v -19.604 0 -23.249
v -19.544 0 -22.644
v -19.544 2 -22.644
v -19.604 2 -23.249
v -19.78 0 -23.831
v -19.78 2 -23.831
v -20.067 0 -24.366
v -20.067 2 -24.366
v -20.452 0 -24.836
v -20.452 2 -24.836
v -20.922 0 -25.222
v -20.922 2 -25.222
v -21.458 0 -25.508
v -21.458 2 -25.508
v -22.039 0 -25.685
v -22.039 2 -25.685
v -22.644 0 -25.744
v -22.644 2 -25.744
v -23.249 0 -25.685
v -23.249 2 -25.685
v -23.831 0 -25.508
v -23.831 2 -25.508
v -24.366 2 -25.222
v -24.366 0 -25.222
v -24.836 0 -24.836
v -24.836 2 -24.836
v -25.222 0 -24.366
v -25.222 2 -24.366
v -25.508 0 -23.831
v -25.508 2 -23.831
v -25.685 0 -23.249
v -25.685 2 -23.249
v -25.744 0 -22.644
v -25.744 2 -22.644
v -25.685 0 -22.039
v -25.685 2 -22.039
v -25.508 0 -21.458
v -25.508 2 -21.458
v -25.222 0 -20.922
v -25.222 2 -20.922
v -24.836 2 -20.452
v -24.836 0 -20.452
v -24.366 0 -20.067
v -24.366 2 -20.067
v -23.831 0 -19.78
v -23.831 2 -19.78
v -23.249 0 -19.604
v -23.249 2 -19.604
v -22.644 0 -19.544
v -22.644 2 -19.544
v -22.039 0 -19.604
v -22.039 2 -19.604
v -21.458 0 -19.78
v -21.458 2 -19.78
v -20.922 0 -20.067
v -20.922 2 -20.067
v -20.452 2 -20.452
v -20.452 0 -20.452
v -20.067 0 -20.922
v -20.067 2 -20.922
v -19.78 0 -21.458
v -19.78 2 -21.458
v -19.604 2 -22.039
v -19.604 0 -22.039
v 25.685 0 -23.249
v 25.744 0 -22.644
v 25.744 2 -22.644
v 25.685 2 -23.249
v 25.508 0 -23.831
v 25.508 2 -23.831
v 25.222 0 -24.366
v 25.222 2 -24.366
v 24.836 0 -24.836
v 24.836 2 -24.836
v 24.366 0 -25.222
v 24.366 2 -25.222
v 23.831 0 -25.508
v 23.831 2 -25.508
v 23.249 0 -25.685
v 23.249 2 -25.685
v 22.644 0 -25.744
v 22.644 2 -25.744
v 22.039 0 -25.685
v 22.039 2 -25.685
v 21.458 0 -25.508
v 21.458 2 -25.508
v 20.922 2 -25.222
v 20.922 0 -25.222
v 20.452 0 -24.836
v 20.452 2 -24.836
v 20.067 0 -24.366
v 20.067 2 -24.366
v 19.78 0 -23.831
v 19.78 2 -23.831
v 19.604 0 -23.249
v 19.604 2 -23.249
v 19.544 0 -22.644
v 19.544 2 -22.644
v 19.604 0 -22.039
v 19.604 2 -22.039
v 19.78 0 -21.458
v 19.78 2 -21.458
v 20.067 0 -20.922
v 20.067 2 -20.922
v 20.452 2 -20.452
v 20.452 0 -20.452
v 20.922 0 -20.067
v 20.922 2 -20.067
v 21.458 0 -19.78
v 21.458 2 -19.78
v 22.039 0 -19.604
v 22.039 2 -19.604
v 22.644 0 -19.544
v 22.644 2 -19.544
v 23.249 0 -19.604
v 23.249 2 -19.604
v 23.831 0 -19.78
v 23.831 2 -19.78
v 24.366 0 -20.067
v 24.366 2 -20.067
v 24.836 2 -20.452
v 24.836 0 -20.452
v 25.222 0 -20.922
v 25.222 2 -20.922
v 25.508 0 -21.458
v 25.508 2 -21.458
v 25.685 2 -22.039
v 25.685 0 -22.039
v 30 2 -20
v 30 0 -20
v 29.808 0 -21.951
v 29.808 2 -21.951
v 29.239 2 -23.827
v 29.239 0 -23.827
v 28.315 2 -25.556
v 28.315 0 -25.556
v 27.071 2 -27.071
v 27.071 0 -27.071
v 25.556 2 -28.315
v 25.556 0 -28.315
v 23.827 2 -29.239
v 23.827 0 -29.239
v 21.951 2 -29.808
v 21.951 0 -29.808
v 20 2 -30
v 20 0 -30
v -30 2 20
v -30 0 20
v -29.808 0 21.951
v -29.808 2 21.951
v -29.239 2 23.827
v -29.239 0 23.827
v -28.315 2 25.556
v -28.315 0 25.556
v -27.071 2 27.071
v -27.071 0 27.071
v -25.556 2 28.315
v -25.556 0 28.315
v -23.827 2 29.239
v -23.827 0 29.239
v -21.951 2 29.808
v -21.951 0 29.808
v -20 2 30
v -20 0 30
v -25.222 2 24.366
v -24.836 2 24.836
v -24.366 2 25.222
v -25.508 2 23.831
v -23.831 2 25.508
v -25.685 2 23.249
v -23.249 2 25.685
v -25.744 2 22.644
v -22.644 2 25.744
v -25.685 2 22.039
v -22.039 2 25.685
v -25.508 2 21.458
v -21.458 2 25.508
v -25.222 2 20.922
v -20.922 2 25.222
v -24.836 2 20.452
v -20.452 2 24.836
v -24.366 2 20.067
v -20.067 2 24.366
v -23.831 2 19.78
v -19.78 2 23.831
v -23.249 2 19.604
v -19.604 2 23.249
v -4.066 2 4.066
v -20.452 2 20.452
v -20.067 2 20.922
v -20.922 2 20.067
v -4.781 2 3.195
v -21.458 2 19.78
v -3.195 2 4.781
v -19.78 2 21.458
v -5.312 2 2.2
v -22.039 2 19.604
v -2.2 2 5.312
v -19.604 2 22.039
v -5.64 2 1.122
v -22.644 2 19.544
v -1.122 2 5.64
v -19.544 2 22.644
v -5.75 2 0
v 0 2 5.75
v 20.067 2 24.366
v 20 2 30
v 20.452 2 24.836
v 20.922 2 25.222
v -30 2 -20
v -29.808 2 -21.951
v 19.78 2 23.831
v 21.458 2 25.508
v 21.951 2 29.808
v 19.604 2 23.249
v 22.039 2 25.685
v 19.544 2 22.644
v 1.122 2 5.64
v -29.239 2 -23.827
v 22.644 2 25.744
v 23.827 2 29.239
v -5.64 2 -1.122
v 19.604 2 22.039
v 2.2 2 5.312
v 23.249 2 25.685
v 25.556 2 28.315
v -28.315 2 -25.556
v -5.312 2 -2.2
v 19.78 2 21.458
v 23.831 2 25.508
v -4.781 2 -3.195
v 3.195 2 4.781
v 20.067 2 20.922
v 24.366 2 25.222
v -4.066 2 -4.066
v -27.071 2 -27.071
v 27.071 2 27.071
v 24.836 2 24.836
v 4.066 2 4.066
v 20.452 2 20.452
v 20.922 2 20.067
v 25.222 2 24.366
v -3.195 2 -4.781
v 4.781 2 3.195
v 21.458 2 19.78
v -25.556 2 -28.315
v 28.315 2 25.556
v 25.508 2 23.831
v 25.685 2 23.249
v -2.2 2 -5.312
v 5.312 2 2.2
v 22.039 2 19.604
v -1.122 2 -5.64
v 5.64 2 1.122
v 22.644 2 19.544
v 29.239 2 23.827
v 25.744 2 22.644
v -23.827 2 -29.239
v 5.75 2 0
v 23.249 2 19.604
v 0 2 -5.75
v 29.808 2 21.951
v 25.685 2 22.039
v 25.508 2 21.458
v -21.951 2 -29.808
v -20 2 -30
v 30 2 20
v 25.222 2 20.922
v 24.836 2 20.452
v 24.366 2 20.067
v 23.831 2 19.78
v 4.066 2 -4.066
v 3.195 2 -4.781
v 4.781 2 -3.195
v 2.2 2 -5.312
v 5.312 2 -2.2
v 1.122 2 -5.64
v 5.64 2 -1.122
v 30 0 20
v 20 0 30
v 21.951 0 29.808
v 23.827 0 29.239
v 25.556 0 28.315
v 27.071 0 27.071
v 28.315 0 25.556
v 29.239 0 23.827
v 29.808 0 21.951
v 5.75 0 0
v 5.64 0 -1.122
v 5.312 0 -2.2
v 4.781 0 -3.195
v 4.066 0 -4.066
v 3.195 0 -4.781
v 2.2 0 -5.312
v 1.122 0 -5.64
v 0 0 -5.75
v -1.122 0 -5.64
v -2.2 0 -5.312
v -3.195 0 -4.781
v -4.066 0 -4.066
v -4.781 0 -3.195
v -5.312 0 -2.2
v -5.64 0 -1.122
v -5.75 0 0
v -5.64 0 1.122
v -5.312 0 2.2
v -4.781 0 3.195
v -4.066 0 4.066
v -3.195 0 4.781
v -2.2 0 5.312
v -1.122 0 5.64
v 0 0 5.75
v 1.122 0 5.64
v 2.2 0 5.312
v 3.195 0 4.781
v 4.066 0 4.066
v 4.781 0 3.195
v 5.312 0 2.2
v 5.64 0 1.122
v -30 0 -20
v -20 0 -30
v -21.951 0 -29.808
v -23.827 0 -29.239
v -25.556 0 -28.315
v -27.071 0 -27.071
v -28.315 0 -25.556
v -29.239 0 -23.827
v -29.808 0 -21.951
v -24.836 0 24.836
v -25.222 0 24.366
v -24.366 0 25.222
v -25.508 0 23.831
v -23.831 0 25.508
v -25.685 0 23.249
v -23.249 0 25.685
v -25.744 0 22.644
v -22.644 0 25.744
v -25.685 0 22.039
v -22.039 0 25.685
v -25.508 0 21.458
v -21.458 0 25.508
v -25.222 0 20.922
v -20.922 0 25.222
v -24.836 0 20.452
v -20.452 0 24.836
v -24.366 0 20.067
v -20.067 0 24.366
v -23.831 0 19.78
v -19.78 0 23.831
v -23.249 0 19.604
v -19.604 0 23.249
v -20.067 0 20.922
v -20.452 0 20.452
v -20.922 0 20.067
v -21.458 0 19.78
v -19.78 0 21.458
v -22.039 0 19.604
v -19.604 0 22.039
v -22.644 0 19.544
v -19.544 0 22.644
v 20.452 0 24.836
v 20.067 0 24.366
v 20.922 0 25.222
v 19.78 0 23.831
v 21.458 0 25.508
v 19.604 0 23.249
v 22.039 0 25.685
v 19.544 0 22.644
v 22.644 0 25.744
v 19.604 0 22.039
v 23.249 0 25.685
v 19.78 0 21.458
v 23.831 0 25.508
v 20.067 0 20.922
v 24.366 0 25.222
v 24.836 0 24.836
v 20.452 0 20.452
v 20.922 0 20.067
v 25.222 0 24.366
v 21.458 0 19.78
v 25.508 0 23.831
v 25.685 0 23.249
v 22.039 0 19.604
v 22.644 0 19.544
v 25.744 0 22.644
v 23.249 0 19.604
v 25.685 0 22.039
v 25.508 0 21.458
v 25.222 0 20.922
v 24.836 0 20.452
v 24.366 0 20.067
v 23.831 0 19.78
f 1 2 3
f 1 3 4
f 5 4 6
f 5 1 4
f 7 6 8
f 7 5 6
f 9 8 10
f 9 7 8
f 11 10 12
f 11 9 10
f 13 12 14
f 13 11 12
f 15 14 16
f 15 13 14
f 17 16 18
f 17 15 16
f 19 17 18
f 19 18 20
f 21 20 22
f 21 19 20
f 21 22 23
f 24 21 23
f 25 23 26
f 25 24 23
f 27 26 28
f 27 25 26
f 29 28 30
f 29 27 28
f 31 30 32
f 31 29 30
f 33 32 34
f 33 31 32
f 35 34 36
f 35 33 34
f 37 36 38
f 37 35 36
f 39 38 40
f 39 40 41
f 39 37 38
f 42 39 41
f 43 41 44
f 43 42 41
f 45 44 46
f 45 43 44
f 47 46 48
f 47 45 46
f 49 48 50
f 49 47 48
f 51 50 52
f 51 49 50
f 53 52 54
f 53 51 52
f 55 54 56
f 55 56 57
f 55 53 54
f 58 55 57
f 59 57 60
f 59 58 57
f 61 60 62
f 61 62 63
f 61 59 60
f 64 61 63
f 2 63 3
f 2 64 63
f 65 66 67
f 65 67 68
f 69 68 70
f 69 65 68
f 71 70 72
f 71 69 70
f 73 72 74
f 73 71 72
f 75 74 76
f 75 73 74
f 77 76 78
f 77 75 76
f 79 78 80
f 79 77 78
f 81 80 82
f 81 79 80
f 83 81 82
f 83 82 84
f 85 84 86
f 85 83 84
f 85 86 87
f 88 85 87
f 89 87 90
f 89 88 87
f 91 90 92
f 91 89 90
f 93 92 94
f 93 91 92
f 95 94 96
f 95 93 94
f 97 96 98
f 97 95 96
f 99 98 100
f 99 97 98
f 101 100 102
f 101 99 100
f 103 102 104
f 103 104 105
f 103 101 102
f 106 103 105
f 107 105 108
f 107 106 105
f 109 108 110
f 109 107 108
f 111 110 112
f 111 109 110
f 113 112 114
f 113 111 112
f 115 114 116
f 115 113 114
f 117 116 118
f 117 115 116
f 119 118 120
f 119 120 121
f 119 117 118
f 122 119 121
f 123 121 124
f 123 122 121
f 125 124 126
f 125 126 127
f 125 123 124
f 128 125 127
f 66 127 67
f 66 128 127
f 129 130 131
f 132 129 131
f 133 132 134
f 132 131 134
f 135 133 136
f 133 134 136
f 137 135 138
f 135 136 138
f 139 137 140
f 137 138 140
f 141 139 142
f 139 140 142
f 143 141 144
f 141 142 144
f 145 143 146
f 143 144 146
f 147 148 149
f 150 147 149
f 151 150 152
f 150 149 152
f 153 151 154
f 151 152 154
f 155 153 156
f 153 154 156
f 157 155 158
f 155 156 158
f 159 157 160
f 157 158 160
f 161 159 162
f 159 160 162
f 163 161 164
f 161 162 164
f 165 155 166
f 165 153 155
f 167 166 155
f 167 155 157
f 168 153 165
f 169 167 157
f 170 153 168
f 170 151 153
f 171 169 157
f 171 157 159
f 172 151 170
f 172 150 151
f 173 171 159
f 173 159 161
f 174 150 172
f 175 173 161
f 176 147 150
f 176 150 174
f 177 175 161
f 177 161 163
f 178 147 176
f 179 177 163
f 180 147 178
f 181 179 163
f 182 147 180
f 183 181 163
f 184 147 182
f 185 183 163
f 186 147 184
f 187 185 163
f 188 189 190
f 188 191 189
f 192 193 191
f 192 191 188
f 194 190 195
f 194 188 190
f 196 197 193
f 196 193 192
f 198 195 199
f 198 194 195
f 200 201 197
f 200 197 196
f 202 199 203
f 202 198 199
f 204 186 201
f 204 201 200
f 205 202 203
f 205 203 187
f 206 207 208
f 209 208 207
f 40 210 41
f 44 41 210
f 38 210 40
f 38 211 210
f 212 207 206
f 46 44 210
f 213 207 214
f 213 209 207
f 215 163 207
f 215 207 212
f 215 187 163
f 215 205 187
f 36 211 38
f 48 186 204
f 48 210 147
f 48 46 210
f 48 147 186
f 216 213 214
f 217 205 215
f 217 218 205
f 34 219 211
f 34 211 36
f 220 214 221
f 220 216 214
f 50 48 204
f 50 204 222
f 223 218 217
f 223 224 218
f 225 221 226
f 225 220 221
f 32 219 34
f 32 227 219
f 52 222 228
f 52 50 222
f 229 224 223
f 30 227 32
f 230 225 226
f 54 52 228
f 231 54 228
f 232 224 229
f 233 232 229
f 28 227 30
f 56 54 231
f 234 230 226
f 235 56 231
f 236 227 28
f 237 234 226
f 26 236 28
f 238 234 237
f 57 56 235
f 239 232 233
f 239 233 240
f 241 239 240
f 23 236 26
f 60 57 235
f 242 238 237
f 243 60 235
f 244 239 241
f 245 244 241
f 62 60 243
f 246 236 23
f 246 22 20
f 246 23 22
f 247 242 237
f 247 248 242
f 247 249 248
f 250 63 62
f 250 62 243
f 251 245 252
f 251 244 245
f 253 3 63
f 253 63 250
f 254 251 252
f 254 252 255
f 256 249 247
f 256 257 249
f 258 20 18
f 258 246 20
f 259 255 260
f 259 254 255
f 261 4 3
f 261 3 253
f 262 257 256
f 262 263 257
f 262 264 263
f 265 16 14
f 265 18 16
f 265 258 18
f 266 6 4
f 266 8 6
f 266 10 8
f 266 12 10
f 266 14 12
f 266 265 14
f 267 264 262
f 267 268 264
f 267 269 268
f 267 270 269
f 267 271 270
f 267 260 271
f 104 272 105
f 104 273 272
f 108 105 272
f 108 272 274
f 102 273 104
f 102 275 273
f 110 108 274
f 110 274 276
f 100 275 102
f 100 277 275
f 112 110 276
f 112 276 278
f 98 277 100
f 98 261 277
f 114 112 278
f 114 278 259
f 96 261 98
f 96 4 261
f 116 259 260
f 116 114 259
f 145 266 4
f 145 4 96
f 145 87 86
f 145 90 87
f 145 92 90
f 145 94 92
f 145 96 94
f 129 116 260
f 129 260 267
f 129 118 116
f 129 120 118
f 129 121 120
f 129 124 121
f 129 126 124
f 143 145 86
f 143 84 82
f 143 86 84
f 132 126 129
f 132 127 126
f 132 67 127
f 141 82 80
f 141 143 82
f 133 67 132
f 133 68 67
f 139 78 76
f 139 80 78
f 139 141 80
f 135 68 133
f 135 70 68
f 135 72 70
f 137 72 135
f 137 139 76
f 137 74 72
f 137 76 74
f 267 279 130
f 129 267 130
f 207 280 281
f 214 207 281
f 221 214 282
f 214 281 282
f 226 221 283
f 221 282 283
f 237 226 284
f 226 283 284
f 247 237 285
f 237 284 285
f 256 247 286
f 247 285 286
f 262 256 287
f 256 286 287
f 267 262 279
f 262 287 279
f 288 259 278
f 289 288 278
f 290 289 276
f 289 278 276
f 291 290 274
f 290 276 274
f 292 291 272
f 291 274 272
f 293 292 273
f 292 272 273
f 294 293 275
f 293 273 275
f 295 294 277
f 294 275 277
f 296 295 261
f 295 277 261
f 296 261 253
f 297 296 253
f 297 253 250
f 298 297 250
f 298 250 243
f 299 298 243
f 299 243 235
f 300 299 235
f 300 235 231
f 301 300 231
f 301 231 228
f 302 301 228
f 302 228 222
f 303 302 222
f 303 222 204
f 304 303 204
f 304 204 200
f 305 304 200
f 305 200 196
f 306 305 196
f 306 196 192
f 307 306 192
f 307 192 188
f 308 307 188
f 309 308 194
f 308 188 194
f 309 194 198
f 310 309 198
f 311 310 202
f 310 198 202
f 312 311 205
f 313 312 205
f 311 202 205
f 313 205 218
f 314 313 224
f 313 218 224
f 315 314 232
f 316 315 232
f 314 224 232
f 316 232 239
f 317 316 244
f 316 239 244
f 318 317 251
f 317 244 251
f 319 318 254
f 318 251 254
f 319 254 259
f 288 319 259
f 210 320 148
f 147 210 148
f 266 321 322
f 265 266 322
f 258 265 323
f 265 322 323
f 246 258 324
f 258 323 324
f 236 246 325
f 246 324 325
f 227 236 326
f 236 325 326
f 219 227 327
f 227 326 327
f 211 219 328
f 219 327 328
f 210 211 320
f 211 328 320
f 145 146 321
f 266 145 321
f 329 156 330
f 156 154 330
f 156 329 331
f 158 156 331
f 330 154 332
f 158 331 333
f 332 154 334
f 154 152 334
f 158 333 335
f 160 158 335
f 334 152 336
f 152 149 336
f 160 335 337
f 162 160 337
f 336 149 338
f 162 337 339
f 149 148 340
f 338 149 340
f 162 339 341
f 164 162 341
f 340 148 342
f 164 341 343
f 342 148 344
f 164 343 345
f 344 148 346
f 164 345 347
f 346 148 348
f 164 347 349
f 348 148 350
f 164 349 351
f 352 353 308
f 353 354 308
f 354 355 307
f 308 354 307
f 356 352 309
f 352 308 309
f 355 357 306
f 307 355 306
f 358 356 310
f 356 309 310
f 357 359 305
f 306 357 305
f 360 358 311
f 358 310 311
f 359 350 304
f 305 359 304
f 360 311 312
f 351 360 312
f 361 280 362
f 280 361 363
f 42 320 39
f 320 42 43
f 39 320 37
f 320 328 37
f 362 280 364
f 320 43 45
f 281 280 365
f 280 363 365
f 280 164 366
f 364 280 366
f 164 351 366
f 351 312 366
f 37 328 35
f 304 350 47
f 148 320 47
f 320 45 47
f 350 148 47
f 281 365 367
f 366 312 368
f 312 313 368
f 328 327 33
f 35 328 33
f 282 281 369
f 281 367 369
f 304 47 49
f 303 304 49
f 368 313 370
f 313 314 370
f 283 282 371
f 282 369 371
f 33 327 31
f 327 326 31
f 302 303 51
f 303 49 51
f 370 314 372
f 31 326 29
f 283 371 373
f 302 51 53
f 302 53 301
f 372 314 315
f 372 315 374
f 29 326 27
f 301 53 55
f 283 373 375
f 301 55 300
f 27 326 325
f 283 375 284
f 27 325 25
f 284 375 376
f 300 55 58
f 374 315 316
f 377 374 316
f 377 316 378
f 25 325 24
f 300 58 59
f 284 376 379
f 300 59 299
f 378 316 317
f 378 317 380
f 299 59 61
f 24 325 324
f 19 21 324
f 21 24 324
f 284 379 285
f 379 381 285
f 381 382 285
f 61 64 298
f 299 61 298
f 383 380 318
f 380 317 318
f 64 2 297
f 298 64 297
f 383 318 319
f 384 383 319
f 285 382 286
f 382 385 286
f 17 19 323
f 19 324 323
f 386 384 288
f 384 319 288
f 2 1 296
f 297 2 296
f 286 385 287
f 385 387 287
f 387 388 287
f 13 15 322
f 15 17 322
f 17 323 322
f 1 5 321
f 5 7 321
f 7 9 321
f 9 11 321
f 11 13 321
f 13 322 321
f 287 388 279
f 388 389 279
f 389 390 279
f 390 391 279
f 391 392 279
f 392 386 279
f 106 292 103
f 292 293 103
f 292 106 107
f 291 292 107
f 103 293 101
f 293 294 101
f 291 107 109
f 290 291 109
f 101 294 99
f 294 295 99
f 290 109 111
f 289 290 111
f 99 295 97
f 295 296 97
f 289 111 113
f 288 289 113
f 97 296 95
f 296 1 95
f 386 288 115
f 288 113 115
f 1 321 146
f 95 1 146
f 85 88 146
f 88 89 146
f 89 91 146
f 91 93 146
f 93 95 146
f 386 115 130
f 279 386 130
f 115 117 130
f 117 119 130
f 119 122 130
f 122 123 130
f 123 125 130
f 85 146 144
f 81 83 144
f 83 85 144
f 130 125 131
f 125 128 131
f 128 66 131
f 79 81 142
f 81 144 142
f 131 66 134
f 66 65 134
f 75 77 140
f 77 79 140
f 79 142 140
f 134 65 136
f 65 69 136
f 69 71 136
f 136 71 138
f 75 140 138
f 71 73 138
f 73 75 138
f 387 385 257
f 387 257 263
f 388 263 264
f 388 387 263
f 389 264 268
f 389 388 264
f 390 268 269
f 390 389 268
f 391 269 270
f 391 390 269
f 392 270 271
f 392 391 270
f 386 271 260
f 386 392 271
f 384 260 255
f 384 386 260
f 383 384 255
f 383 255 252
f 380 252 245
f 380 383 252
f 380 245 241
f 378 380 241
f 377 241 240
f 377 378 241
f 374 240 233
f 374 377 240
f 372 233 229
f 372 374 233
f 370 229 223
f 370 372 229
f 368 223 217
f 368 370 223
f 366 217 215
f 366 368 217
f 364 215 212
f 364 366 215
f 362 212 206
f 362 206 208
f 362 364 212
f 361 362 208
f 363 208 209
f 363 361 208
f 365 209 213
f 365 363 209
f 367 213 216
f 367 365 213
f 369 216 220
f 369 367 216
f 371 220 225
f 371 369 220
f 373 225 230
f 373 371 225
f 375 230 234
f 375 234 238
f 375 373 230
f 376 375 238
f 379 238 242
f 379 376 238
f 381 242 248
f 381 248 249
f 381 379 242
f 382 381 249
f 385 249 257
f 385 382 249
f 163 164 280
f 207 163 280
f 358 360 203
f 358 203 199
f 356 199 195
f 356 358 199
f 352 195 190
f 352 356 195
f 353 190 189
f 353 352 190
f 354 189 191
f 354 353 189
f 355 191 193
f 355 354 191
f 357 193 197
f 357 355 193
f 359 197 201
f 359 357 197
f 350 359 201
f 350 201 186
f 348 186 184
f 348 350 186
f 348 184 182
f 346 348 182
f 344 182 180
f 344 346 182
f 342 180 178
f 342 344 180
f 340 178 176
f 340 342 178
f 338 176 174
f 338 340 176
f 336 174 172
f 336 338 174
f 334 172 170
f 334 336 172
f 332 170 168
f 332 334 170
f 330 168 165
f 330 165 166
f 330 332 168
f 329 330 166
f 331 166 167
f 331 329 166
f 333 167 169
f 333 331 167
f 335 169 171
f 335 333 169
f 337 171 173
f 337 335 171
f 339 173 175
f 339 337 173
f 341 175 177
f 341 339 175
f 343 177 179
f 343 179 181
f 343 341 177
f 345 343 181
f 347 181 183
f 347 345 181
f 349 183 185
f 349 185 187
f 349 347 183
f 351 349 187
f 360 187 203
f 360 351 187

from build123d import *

# Parameters (mm, degrees)
SKETCH1_R           = 3.1
BOSS_EXTRUDE1_DEPTH = 2
SKETCH2_R           = 5.75
CUT_EXTRUDE1_DEPTH  = 3


with BuildPart() as part:
    # Sketch1 → Boss-Extrude1 (new body)
    with BuildSketch(Plane(origin=(0, 0, 0), x_dir=(1, 0, 0), z_dir=(0, 1, 0))):
        with BuildLine():
            Line((-20, -30), (20, -30))
            ThreePointArc((20, -30), (27.071067812, -27.071067812), (30, -20))
            Line((30, -20), (30, 20))
            ThreePointArc((30, 20), (27.071067812, 27.071067812), (20, 30))
            Line((20, 30), (-20, 30))
            ThreePointArc((-20, 30), (-27.071067812, 27.071067812), (-30, 20))
            Line((-30, 20), (-30, -20))
            ThreePointArc((-30, -20), (-27.071067812, -27.071067812), (-20, -30))
        make_face()
        with Locations((-22.644230769, 22.644230769)):
            Circle(SKETCH1_R, mode=Mode.SUBTRACT)
        with Locations((-22.644230769, -22.644230769)):
            Circle(SKETCH1_R, mode=Mode.SUBTRACT)
        with Locations((22.644230769, -22.644230769)):
            Circle(SKETCH1_R, mode=Mode.SUBTRACT)
        with Locations((22.644230769, 22.644230769)):
            Circle(SKETCH1_R, mode=Mode.SUBTRACT)
    extrude(amount=BOSS_EXTRUDE1_DEPTH)

    # Sketch2 → Cut-Extrude1 (cut, through all)
    with BuildSketch(Plane(origin=(0, 2, 0), x_dir=(1, 0, 0), z_dir=(0, 1, 0))):
        Circle(SKETCH2_R)
    extrude(amount=-CUT_EXTRUDE1_DEPTH, mode=Mode.SUBTRACT)


solid = part.part
